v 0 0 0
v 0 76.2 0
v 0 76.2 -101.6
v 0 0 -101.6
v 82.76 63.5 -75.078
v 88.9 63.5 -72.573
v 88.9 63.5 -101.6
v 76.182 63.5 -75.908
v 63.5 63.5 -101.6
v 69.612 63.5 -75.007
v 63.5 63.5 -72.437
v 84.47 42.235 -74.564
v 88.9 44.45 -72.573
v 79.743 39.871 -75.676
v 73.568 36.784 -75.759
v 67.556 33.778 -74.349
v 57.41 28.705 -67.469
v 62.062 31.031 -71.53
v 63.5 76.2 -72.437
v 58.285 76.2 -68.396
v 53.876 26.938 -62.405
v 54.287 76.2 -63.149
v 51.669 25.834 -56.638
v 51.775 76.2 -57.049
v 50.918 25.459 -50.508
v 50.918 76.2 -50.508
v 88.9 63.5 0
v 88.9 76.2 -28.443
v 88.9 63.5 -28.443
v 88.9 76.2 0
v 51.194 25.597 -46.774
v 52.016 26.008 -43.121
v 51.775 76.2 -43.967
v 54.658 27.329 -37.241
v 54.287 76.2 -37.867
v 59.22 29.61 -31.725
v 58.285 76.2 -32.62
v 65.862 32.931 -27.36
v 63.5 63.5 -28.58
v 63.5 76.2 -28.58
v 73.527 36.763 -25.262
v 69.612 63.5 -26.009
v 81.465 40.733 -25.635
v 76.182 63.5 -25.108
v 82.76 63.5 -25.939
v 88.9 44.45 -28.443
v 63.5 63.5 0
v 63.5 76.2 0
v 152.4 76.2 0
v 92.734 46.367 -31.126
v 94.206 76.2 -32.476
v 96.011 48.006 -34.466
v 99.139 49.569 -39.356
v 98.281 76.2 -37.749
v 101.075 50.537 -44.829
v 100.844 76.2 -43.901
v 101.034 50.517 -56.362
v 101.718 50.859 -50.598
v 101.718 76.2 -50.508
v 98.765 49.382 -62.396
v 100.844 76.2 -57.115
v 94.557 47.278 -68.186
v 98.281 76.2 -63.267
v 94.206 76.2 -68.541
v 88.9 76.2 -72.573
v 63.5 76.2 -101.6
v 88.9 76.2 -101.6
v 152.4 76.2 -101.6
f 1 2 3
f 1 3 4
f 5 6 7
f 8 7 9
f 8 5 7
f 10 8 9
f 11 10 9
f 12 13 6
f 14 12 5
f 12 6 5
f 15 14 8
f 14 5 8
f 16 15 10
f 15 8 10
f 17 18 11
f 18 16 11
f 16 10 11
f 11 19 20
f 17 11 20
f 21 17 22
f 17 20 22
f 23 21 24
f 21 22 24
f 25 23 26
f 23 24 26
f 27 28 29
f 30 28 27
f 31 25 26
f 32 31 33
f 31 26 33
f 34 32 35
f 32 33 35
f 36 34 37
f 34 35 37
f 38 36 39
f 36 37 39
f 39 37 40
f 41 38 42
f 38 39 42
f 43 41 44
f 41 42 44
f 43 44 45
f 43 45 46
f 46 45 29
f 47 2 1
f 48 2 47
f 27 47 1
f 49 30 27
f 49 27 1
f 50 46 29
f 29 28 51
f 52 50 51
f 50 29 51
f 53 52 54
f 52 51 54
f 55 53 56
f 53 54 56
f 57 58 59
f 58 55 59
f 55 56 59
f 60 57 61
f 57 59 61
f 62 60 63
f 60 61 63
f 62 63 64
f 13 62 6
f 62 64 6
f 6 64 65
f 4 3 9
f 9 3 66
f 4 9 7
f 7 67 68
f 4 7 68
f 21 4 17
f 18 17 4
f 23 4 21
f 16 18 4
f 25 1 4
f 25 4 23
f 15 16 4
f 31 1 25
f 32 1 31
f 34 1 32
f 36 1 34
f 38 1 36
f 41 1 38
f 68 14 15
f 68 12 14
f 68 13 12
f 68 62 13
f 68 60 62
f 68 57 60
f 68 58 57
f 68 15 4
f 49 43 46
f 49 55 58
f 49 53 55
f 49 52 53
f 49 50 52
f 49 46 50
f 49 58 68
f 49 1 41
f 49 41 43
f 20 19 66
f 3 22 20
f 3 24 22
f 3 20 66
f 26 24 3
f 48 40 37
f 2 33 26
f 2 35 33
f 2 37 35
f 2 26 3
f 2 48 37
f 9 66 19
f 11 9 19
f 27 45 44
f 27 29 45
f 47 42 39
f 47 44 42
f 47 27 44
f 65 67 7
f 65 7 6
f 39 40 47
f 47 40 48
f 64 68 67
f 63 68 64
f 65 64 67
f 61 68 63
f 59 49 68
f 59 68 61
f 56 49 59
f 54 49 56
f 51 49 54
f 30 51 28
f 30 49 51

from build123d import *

# Parameters (mm, degrees)
F1_DEPTH = 101.6
F2_W     = 25.4
F2_H     = 101.6
F3_DEPTH = 12.7
F5_DEPTH = 76.201


with BuildPart() as f1:
    # F0 (on Top) → F1 (new body)
    with BuildSketch(Plane.XY):
        Polygon((0, 76.2), (0, 0), (152.4, 76.2), align=None)
    extrude(amount=-F1_DEPTH)

    # F2 (on face) → F3 (cut)
    with BuildSketch(Plane(origin=(0, 76.2, 0), x_dir=(-1, 0, 0), z_dir=(0, 1, 0))):
        with Locations((-76.2, -50.8)):
            Rectangle(F2_W, F2_H)
    extrude(amount=-F3_DEPTH, mode=Mode.SUBTRACT)

    # F4 (on face) → F5 (cut, through all)
    with BuildSketch(Plane(origin=(0, 76.2, 0), x_dir=(-1, 0, 0), z_dir=(0, 1, 0))):
        with BuildLine():
            ThreePointArc((-88.9, -72.5728585247), (-63.5591417828, -72.4710526239), (-50.9180106878, -50.5081005394))
            ThreePointArc((-50.9180106878, -50.5081005394), (-63.5591417828, -28.545148455), (-88.9, -28.4433425542))
            Line((-88.9, -28.4433425542), (-88.9, -72.5728585247))
        make_face()
        with BuildLine():
            Line((-88.9, -72.5728585247), (-88.9, -28.4433425542))
            ThreePointArc((-88.9, -28.4433425542), (-101.7180106878, -50.5081005394), (-88.9, -72.5728585247))
        make_face()
    extrude(amount=-F5_DEPTH, mode=Mode.SUBTRACT)


solid = f1.part
